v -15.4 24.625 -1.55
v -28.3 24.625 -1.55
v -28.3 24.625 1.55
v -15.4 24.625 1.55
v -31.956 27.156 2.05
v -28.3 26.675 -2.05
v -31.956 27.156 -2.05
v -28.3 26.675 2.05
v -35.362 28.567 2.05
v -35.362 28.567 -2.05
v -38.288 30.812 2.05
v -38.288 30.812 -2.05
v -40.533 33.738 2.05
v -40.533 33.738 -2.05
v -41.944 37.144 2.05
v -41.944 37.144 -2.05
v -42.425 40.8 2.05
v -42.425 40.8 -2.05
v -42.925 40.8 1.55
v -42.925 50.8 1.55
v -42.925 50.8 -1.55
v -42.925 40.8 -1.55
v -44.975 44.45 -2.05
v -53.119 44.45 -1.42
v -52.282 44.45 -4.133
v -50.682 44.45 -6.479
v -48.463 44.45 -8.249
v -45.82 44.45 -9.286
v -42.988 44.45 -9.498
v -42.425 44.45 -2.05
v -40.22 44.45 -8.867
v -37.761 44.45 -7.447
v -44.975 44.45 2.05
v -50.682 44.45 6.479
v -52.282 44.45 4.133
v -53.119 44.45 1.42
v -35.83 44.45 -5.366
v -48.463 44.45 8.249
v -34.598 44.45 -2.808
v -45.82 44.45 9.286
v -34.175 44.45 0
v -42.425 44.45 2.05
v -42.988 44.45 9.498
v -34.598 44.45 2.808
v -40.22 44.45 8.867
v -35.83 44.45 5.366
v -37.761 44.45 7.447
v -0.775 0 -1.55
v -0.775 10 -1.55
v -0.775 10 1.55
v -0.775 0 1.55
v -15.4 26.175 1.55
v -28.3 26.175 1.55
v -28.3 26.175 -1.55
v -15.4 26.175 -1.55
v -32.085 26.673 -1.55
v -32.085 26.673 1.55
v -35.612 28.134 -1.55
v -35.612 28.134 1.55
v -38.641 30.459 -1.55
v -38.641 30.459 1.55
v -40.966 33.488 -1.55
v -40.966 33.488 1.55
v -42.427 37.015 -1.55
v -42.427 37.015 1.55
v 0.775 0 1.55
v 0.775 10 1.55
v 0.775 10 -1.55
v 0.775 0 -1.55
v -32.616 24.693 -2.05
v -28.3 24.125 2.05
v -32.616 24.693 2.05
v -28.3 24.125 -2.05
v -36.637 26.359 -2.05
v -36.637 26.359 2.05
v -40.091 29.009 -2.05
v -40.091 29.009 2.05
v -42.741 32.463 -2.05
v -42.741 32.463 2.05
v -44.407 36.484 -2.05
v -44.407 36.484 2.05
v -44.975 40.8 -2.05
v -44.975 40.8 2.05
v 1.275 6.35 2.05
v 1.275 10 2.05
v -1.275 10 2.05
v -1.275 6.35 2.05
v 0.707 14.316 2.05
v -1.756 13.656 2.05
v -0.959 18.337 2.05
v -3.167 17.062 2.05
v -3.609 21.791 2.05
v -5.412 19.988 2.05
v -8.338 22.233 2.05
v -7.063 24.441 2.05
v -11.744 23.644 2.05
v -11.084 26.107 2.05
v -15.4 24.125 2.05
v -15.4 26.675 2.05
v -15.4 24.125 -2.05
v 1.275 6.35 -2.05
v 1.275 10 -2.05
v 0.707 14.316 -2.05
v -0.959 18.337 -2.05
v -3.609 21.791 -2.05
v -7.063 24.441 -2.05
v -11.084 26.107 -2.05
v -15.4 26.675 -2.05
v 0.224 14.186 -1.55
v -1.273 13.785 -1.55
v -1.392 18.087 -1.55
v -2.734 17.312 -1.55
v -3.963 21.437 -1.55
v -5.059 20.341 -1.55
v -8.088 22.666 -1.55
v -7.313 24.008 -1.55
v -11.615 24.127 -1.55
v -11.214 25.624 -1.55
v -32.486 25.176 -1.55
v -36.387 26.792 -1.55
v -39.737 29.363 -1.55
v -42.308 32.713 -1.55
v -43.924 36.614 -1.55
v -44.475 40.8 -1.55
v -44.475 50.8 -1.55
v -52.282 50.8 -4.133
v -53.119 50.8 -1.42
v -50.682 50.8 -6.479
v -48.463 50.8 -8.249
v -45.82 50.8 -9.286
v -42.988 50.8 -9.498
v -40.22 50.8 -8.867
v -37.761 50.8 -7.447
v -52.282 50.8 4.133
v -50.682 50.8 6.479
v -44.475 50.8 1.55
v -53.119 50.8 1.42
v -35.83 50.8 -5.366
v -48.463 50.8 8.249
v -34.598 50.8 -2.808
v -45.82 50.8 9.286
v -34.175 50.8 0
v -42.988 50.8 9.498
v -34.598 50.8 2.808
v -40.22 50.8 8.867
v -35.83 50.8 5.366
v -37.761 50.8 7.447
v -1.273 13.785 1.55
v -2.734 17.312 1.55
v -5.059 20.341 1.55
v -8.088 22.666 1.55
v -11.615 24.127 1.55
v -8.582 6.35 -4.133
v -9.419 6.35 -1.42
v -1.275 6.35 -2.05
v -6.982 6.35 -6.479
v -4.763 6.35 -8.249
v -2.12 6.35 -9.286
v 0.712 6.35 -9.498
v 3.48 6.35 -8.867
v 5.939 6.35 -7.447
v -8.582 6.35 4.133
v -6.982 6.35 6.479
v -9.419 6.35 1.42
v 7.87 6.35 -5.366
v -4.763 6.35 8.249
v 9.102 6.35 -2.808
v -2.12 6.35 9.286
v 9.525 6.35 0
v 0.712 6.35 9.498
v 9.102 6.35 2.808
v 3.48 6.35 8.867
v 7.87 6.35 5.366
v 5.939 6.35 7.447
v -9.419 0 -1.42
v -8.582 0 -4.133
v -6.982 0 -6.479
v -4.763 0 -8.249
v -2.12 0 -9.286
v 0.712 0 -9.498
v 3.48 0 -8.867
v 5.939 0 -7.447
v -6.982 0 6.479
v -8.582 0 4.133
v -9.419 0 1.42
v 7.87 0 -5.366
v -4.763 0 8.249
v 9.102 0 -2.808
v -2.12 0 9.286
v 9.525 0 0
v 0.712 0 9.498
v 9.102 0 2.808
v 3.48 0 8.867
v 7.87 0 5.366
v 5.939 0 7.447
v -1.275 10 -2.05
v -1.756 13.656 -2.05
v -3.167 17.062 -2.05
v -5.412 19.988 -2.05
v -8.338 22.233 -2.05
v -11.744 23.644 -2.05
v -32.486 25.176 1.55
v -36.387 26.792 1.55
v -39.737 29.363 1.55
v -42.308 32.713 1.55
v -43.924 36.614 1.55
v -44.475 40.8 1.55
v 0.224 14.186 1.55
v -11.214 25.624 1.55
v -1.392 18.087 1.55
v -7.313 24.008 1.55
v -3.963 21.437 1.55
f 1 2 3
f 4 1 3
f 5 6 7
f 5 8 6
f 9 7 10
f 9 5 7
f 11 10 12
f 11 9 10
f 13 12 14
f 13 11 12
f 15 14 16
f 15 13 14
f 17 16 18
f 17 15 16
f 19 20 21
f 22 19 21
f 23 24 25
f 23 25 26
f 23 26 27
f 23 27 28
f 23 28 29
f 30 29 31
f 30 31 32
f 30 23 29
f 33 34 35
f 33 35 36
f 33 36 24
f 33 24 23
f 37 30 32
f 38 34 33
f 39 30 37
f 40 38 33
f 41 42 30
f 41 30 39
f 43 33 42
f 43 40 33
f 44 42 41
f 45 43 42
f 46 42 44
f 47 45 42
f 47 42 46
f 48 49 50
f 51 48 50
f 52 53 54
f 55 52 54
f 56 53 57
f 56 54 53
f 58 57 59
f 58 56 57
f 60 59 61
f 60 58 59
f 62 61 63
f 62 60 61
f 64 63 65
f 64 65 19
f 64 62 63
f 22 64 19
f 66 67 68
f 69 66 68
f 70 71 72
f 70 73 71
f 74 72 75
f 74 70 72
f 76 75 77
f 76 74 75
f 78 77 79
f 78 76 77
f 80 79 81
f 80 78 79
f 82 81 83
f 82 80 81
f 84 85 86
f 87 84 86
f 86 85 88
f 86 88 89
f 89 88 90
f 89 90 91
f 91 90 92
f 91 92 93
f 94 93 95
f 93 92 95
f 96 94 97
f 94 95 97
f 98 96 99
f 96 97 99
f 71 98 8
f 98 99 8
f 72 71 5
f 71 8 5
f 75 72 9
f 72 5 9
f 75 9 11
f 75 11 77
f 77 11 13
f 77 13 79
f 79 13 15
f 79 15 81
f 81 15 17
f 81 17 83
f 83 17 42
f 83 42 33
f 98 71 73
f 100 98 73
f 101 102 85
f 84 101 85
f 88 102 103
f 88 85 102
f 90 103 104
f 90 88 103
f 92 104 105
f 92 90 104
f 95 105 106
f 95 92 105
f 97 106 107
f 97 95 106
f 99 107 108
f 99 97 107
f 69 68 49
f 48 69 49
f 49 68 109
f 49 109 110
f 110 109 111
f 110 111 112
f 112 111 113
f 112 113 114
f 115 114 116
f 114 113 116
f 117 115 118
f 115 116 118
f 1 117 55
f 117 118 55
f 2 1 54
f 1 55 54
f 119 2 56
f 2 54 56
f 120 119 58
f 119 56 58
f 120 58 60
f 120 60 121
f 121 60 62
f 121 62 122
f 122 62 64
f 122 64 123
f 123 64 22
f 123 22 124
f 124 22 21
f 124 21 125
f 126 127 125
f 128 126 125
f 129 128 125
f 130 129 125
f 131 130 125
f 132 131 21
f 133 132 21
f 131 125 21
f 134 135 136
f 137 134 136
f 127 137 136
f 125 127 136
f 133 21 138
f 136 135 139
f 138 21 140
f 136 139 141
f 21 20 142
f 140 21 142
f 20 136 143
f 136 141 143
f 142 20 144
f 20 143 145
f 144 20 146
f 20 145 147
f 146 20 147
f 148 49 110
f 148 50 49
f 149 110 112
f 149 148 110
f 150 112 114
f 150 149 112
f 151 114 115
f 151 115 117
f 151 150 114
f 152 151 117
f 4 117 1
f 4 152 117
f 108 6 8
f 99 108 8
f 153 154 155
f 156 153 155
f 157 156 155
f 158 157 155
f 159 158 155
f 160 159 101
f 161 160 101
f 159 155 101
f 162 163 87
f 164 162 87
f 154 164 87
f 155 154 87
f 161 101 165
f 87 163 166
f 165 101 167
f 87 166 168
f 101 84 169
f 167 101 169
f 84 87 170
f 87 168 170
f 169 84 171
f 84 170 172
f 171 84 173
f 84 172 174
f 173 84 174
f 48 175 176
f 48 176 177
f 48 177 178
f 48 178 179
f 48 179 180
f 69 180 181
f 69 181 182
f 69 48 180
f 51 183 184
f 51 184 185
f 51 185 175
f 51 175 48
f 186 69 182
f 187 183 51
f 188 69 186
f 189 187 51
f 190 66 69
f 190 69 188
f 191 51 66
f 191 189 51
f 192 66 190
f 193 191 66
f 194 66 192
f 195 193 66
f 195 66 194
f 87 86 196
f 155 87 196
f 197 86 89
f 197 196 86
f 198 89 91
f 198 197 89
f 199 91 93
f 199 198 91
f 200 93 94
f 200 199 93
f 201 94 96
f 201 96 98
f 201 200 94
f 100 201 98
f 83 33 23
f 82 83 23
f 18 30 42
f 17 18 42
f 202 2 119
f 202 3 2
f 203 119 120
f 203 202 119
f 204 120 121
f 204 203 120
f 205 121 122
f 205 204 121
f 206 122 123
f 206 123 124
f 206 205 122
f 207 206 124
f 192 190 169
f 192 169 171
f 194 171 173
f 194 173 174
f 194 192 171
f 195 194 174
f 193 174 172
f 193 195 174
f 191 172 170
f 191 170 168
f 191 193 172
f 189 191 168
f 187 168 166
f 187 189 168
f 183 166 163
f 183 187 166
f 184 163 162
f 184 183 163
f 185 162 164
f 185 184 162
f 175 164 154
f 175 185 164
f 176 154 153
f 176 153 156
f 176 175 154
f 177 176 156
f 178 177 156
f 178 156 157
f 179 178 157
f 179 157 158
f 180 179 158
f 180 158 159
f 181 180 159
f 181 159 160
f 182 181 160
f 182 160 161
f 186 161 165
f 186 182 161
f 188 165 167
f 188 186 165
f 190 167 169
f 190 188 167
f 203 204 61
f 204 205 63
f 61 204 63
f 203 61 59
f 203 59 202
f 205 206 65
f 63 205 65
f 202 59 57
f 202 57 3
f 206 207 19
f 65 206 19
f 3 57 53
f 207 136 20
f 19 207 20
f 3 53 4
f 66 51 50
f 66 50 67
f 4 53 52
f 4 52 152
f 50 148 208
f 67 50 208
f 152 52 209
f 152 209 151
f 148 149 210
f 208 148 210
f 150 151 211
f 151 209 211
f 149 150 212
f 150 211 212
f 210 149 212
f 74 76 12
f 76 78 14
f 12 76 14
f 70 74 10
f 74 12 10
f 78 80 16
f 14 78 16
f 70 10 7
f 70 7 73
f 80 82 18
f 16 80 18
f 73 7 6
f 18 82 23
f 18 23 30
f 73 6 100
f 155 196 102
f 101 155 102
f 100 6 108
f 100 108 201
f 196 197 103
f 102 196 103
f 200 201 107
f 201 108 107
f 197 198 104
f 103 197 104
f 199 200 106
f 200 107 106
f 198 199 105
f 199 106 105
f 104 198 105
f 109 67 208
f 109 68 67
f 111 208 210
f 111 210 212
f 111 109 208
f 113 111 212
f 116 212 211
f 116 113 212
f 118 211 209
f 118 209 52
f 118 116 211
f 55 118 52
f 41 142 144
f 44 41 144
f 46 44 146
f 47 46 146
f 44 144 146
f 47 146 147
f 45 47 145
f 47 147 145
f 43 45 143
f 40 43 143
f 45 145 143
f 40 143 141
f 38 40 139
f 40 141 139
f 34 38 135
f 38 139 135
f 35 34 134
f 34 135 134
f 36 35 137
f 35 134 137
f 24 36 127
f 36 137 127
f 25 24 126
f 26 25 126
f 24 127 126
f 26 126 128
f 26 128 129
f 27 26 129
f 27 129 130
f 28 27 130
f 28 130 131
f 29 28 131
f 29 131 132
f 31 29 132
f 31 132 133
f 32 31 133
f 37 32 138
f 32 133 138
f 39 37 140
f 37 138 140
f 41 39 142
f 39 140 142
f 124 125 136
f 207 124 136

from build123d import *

# Parameters (mm, degrees)
F1_W     = 2.55
F1_H     = 4.1
F1_W_2   = 1.55
F1_H_2   = 3.1
F1_R     = 9.525
F5_DEPTH = 6.35
F3_R     = 9.525
F3_W     = 2.55
F3_H     = 4.1
F6_DEPTH = 6.35


with BuildPart() as f4:
    # F4: sweep along a path in F0
    with BuildLine(Plane.XY) as f4_path:
        Line((0, 0), (0, 10))
        ThreePointArc((0, 10), (-4.510556, 20.889444), (-15.4, 25.4))
        Line((-15.4, 25.4), (-21.85, 25.4))
        Line((-21.85, 25.4), (-28.3, 25.4))
        ThreePointArc((-28.3, 25.4), (-39.189444, 29.910556), (-43.7, 40.8))
        Line((-43.7, 40.8), (-43.7, 50.8))
    # F1 (on Front) → F4 (sweep)
    with BuildSketch(Plane.XZ):
        Rectangle(F1_W, F1_H)
        Rectangle(F1_W_2, F1_H_2, mode=Mode.SUBTRACT)
    sweep(path=f4_path.line)

    # F1 (on Front) → F5 (join)
    with BuildSketch(Plane.XZ):
        Circle(F1_R)
        Rectangle(F1_W, F1_H, mode=Mode.SUBTRACT)
    extrude(amount=-F5_DEPTH)

    # F3 (on offset) → F6 (join)
    with BuildSketch(Plane.XZ.offset(-50.8)):
        with Locations((-43.7, 0)):
            Circle(F3_R)
        with Locations((-43.7, 0)):
            Rectangle(F3_W, F3_H, mode=Mode.SUBTRACT)
    extrude(amount=F6_DEPTH)


solid = f4.part
